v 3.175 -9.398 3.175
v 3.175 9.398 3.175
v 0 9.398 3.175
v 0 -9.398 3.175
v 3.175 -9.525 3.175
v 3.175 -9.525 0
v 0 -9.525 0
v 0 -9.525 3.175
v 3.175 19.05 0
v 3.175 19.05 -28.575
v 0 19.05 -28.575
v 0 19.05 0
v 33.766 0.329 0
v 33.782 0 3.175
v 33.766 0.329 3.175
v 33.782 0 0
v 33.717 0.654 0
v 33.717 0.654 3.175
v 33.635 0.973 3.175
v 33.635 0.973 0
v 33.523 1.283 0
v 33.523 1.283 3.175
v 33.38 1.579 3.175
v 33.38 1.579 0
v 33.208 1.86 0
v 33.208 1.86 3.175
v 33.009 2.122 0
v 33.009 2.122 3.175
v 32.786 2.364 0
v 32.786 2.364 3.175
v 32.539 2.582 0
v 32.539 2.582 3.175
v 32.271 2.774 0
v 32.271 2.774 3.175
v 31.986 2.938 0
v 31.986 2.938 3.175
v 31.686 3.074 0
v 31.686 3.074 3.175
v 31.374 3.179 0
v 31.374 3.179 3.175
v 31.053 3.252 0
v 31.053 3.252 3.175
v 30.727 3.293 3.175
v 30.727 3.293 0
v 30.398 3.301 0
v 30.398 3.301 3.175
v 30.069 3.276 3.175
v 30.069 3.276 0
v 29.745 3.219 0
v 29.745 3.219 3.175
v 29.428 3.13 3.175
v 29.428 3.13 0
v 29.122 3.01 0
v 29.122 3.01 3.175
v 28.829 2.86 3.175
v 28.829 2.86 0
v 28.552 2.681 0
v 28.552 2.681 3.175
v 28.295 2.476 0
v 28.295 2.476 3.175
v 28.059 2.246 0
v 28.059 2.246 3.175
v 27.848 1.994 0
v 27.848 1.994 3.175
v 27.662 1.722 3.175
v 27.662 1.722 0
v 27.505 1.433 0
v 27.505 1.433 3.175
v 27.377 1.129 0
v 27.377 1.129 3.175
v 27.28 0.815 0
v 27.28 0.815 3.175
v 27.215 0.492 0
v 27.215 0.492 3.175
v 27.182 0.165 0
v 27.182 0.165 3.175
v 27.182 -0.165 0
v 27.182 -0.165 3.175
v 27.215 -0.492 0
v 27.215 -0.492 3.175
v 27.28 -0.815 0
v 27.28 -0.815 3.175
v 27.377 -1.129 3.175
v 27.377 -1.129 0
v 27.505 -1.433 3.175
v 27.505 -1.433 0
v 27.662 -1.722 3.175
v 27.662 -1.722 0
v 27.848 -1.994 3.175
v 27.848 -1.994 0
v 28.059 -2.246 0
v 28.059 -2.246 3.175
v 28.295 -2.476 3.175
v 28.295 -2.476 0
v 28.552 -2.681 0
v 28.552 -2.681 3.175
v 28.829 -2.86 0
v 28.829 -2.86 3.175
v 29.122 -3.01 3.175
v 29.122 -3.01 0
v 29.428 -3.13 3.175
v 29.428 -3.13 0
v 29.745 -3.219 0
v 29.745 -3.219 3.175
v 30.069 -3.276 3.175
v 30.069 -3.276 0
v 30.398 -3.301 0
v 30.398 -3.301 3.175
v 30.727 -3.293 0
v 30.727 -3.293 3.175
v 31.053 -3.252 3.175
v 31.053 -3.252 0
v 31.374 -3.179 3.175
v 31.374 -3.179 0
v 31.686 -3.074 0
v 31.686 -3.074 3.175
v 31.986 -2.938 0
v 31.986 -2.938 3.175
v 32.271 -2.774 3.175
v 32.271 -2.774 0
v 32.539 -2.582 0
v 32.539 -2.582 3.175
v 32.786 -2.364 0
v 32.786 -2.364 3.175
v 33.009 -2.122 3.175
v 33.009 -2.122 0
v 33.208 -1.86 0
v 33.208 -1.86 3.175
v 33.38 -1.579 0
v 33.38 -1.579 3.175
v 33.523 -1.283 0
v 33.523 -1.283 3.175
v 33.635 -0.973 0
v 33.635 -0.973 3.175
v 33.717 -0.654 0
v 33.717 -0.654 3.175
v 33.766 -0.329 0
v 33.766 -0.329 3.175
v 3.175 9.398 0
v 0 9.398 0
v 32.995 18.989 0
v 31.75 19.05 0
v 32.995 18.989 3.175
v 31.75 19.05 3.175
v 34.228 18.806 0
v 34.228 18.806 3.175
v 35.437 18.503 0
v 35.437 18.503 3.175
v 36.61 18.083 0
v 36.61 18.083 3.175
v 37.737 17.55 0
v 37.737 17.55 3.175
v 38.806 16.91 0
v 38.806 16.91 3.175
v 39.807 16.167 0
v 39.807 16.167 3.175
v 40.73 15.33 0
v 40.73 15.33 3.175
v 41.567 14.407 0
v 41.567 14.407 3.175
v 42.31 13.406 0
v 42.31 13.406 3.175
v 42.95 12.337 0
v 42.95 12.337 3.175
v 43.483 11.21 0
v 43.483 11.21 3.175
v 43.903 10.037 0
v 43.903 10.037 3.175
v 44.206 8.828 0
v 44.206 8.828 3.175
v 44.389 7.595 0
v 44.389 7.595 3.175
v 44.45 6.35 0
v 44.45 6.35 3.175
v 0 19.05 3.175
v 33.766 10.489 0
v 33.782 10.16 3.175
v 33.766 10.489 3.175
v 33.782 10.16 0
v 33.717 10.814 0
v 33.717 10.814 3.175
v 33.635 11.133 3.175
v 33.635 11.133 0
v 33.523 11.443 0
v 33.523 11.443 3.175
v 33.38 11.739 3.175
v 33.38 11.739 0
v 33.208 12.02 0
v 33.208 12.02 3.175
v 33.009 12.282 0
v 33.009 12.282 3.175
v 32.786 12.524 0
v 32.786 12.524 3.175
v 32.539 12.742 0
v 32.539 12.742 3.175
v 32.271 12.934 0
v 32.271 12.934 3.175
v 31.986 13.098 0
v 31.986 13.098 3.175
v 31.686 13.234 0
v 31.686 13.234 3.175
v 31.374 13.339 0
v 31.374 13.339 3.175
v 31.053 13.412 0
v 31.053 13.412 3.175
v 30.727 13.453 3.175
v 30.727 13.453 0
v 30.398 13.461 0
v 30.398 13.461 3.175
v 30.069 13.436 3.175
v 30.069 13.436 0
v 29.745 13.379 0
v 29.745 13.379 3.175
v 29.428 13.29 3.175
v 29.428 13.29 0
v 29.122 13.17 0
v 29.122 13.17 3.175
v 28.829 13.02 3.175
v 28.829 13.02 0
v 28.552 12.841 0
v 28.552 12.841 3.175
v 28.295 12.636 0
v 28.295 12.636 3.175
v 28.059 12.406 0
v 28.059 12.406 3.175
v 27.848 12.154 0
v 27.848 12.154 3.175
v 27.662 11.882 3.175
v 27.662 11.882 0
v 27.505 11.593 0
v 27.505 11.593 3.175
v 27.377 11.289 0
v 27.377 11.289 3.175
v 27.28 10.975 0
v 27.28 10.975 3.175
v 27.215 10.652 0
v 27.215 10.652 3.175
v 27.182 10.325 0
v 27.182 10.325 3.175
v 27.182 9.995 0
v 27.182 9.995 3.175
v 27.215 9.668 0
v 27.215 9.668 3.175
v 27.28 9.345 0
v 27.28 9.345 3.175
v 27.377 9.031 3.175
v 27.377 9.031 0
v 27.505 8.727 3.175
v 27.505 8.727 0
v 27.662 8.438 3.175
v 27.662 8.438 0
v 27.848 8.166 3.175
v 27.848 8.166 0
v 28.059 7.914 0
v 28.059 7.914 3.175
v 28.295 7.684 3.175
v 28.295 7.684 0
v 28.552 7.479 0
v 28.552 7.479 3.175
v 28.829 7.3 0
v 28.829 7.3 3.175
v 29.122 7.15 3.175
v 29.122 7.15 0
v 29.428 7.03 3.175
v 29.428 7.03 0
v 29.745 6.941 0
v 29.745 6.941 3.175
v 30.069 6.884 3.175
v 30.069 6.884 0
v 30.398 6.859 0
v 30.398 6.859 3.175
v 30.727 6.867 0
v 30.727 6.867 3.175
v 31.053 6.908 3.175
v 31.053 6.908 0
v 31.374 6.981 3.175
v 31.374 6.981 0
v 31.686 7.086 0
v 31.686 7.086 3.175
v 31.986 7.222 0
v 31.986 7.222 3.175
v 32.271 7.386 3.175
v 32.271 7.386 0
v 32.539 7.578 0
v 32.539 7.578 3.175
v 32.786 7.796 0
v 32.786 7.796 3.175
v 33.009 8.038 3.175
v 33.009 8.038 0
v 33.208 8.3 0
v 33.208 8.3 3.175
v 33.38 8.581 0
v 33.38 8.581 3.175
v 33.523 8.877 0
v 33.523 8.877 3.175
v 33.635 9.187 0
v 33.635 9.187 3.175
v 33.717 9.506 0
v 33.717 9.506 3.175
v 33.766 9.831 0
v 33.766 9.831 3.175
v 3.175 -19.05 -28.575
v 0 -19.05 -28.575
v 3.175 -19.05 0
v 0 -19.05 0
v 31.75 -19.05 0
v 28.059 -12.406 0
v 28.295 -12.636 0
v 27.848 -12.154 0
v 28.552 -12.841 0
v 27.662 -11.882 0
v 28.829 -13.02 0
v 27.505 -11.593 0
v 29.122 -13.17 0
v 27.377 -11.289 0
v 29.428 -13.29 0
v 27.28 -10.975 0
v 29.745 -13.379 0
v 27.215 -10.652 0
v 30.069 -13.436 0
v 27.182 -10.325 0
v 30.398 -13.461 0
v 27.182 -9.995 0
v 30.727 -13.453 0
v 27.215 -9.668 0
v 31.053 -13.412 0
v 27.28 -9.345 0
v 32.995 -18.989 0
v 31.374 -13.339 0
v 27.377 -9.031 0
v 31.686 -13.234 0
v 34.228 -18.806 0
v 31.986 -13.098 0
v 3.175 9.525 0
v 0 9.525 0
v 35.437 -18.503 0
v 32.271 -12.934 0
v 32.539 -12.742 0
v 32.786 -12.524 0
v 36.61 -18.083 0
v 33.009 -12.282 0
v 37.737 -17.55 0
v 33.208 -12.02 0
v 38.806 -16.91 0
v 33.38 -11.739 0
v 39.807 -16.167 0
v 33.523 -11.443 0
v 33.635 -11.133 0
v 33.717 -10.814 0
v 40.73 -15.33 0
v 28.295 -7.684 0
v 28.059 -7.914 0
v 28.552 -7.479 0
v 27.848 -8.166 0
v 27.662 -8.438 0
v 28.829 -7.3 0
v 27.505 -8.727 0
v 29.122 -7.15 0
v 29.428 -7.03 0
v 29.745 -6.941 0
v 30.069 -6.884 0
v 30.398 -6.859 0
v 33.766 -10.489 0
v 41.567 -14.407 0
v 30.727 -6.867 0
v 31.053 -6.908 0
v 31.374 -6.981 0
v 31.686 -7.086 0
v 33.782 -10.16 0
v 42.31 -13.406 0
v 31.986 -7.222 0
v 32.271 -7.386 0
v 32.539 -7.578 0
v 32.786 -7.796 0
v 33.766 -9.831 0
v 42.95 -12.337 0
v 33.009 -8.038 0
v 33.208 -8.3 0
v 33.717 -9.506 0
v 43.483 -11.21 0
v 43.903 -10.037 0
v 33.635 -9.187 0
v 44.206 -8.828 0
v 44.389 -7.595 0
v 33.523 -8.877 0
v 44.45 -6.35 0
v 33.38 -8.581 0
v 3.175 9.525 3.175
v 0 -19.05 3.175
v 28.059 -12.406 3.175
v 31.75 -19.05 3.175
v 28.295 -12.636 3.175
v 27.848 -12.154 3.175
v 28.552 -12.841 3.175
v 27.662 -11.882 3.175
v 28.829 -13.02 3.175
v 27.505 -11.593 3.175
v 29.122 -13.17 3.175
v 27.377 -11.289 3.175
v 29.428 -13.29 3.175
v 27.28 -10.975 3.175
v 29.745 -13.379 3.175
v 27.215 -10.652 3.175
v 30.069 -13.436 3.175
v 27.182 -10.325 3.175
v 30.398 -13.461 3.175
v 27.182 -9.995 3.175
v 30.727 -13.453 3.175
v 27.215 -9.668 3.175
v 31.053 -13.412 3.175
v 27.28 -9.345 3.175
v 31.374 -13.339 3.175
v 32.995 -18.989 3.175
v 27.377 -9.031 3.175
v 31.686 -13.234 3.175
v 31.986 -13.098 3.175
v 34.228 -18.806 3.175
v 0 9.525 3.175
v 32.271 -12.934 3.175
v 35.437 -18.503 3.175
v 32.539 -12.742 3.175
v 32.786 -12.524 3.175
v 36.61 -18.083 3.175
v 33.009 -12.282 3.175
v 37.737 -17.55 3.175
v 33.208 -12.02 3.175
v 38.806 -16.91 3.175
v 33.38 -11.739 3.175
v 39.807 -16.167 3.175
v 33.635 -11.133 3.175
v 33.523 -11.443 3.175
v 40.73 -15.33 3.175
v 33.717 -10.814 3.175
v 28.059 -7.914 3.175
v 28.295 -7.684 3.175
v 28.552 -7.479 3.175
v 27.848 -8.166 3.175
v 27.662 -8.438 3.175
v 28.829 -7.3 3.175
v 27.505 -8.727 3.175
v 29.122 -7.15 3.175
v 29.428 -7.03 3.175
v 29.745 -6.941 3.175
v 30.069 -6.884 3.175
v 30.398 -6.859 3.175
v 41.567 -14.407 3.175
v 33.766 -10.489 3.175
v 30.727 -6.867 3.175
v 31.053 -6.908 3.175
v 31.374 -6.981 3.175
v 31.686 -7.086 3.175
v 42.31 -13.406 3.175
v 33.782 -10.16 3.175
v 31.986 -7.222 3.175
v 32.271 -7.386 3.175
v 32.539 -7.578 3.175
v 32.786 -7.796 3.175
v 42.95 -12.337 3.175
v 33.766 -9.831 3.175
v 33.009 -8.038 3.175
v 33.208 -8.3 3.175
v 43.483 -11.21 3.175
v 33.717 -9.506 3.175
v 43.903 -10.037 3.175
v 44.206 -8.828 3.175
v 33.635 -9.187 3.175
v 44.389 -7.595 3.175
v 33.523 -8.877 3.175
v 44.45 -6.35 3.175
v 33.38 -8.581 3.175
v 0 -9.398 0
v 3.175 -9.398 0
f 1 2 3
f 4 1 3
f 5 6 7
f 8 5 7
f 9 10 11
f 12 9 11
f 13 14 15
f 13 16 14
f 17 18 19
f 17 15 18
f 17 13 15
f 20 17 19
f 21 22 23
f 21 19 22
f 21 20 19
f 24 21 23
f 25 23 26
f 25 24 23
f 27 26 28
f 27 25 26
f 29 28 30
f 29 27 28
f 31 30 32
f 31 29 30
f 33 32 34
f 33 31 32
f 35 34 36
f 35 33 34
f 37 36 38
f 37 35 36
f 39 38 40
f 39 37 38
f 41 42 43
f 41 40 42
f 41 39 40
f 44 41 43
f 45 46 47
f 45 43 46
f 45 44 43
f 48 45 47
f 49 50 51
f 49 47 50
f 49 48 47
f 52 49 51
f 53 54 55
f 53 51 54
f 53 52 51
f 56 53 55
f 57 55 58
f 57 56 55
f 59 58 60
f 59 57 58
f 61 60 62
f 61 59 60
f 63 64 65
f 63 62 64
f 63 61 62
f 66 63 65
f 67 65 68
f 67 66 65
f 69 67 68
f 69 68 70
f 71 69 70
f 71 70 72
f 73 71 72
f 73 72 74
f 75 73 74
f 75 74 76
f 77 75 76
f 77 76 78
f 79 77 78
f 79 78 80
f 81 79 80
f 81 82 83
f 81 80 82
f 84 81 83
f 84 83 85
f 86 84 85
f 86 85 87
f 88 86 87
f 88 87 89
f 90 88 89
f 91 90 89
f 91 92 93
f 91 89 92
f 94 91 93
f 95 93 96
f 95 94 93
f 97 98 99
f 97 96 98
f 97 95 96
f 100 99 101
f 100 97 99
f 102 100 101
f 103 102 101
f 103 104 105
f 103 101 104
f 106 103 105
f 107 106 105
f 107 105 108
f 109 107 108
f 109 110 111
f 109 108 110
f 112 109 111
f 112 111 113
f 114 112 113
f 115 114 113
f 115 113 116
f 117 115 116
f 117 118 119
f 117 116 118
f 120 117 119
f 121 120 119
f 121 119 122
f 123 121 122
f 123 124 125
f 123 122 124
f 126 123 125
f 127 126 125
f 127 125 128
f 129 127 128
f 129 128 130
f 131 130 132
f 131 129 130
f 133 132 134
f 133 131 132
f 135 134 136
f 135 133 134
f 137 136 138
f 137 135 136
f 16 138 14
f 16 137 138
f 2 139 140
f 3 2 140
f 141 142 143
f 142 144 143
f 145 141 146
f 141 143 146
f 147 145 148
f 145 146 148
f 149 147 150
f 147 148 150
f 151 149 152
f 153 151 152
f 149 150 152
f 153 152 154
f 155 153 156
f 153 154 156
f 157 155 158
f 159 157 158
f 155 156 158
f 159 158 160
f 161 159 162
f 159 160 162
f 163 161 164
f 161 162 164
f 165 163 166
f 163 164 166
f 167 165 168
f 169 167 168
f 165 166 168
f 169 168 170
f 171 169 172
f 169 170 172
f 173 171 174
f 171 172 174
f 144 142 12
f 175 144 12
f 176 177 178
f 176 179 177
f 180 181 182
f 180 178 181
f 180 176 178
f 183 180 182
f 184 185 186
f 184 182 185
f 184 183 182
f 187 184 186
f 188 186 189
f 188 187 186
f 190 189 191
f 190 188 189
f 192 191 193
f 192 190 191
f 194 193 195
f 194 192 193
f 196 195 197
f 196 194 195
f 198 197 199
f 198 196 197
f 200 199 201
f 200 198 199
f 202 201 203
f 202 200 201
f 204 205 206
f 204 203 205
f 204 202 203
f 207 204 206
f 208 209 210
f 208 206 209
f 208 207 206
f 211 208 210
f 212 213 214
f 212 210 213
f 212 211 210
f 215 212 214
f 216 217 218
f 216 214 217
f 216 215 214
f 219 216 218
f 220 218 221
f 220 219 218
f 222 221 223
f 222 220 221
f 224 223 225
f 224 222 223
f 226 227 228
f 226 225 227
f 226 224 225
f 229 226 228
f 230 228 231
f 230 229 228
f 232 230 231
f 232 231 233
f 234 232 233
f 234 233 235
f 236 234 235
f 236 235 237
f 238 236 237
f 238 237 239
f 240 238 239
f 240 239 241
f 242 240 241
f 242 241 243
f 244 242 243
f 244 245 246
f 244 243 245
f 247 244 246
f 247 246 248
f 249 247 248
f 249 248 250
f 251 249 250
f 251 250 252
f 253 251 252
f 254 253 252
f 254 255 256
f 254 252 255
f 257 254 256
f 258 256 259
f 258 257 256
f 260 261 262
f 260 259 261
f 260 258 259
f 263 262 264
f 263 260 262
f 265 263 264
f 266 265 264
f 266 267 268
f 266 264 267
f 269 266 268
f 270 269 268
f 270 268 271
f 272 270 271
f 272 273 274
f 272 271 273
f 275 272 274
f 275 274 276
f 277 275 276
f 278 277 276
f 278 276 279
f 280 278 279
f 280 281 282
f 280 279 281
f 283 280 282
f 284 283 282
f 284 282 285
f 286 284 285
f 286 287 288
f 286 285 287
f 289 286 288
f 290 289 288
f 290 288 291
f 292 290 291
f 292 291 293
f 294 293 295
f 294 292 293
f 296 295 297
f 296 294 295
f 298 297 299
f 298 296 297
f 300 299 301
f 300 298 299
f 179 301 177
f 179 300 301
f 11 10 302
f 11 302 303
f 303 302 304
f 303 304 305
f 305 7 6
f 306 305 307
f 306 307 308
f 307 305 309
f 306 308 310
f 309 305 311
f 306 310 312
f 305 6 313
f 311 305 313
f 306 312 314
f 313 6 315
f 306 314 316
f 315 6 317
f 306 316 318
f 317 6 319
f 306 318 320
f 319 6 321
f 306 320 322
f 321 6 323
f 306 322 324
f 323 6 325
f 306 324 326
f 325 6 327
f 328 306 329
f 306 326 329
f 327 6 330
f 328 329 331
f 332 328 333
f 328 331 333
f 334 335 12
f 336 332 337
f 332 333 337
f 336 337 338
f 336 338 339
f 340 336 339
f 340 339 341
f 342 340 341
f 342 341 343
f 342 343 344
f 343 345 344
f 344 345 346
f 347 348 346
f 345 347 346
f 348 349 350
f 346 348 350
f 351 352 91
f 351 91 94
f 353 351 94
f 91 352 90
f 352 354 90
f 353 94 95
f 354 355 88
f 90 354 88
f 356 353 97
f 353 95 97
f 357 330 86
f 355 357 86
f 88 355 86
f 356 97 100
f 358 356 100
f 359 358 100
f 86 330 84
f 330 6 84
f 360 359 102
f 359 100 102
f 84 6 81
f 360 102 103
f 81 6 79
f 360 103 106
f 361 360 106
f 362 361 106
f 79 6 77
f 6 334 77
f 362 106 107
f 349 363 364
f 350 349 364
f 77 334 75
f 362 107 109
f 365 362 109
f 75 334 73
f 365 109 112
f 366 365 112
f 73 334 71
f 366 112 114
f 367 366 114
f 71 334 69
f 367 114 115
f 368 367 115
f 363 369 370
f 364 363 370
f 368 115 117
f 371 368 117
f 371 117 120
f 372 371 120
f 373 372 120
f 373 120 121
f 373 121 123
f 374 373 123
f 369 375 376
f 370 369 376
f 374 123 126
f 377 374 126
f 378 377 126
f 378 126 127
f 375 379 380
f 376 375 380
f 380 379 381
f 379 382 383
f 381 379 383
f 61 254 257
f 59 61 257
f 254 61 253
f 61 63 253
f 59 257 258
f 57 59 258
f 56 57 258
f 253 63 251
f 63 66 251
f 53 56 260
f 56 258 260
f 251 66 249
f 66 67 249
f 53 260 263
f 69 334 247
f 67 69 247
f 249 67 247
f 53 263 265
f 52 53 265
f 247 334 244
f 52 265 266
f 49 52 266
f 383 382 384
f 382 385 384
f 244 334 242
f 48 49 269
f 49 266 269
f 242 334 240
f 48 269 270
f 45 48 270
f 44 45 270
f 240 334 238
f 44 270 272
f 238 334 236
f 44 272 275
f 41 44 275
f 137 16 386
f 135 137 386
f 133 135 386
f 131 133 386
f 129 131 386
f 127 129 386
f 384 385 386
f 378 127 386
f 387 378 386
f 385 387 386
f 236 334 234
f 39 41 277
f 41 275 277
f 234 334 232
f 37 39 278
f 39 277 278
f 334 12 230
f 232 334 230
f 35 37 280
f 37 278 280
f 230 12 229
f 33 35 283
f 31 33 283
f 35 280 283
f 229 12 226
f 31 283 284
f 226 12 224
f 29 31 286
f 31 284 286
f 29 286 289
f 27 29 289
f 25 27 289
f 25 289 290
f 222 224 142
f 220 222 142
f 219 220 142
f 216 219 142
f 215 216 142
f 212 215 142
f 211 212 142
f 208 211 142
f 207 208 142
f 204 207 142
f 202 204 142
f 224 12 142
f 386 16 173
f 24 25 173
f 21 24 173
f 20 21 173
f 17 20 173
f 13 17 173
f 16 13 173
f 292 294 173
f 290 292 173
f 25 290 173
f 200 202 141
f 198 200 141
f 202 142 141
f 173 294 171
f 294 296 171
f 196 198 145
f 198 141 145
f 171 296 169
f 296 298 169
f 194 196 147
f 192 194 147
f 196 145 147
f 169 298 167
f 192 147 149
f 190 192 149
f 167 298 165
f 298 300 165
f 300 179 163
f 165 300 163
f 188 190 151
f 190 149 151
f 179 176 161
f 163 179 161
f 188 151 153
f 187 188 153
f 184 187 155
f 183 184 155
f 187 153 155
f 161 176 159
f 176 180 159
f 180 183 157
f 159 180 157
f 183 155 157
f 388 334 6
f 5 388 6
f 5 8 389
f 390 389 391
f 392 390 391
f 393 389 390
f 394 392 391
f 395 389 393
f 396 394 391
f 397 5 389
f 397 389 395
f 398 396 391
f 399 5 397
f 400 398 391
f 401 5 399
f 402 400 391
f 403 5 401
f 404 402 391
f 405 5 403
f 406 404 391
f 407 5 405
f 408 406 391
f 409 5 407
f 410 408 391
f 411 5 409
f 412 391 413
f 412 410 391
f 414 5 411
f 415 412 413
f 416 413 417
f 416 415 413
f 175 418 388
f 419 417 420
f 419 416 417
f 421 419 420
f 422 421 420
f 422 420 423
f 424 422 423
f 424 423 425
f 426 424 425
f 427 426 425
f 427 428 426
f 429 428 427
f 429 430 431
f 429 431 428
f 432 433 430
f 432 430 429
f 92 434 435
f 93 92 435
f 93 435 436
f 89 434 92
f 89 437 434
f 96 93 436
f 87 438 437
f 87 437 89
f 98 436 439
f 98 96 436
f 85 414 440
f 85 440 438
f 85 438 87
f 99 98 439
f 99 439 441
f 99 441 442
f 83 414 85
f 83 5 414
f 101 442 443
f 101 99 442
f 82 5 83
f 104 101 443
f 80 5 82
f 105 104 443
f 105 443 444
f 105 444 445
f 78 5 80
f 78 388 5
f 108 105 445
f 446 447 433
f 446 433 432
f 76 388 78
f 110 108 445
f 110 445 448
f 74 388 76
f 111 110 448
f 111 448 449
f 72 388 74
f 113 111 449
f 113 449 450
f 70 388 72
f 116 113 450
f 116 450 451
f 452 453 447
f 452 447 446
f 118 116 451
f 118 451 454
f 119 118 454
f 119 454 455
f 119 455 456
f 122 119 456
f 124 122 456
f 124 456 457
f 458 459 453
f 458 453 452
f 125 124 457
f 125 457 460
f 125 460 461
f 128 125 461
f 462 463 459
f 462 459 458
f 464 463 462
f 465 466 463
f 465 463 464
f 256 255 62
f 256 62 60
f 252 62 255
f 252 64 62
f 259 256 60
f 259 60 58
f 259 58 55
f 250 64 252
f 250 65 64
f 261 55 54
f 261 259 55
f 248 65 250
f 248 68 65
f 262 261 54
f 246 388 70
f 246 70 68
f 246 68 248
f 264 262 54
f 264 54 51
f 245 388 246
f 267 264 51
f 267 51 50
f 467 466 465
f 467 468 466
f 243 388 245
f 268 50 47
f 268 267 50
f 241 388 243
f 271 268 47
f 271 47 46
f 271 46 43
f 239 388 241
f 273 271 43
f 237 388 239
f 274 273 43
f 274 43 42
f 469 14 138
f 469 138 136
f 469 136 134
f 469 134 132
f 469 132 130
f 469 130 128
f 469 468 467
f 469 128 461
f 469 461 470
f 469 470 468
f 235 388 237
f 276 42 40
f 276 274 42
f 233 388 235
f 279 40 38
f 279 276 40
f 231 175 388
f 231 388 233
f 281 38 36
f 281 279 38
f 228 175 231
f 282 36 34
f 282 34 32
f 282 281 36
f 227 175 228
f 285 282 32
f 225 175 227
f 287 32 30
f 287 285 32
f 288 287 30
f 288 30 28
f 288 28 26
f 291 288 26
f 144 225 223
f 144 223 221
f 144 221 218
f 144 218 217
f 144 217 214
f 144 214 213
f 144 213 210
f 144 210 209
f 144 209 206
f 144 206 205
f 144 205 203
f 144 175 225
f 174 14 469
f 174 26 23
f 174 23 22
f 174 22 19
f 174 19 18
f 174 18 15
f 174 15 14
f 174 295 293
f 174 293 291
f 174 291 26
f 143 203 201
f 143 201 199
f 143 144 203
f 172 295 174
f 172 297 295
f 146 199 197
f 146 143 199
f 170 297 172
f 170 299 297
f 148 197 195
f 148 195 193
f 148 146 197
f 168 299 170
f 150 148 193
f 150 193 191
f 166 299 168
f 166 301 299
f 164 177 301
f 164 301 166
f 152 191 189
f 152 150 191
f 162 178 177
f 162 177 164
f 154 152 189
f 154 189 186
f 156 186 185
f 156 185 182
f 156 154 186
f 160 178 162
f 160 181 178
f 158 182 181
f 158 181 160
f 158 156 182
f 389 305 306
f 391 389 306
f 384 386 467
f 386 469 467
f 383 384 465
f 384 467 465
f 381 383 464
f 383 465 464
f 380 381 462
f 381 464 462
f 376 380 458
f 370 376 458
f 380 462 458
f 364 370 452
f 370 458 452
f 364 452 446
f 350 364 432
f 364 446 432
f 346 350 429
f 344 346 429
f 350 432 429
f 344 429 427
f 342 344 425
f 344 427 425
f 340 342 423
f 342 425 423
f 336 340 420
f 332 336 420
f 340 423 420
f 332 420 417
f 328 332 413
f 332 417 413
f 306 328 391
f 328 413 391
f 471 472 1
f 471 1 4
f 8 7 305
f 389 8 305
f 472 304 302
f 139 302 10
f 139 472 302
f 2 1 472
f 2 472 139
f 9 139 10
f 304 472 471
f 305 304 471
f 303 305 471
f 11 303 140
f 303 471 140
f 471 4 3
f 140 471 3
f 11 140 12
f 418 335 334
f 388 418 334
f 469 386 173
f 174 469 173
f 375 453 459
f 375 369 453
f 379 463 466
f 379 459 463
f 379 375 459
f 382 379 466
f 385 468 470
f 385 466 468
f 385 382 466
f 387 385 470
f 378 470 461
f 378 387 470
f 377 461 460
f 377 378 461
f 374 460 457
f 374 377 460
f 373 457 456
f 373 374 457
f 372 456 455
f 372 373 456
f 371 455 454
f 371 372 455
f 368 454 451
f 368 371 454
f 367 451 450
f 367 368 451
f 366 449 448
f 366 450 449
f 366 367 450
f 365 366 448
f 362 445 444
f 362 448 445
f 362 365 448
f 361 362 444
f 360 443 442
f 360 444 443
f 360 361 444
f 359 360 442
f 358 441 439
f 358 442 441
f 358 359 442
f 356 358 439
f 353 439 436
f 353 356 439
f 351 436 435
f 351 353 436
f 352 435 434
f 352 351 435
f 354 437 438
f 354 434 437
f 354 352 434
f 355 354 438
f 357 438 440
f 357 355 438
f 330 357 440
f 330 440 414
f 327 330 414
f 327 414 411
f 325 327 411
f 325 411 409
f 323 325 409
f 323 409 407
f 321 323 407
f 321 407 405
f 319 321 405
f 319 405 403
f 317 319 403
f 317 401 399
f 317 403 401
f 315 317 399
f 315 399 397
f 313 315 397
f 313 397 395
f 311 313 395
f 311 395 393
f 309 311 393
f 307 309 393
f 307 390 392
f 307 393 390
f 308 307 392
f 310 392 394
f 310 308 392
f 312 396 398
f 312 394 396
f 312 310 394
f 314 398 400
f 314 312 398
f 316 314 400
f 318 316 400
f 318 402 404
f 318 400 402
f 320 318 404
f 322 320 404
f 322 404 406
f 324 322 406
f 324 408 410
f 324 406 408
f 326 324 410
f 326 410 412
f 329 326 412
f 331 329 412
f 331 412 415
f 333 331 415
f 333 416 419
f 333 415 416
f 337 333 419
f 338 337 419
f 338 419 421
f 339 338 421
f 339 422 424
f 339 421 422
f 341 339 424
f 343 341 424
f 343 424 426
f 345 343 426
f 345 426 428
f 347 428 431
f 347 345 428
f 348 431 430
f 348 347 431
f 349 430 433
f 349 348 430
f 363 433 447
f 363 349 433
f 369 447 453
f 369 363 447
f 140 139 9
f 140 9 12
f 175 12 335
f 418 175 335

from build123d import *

# Parameters (mm, degrees)
BOSS_EXTRUDE1_DEPTH     = 3.175
CUT_EXTRUDE1_DEPTH      = 49.464271634
CUT_EXTRUDE1_DEPTH_BACK = 49.464271634
SKETCH2_R               = 3.302
SKETCH3_W               = 3.175
SKETCH3_H               = 38.1
BOSS_EXTRUDE2_DEPTH     = 28.575
SKETCH3_4_W             = 3.175
SKETCH3_4_H             = 18.796
BOSS_EXTRUDE5_DEPTH     = 3.175
FILLET1_R               = 12.7


with BuildPart() as part:
    # Sketch1 → Boss-Extrude1 (new body)
    with BuildSketch(Plane.XY):
        Polygon((0, 19.05), (0, 9.525), (3.175, 9.525), (3.175, -9.525), (0, -9.525), (0, -19.05), (44.45, -19.05), (44.45, 19.05), align=None)
    extrude(amount=BOSS_EXTRUDE1_DEPTH)

    # Sketch2 → Cut-Extrude1 (cut, two sides: drawn at the far end of the back side and taken through both)
    with BuildSketch(Plane.XY.offset(3.175).offset(-CUT_EXTRUDE1_DEPTH_BACK)):
        with Locations((30.48, 10.16)):
            Circle(SKETCH2_R)
        with Locations((30.48, -10.16)):
            Circle(SKETCH2_R)
        with Locations((30.48, 0)):
            Circle(SKETCH2_R)
    extrude(amount=CUT_EXTRUDE1_DEPTH + CUT_EXTRUDE1_DEPTH_BACK, mode=Mode.SUBTRACT)

    # Fillet1
    fillet1_edges = [part.edges().sort_by_distance(p)[0] for p in [
        (44.45, 19.05, 1.5875),
        (44.45, -19.05, 1.5875),
    ]]
    fillet(fillet1_edges, radius=FILLET1_R)


with BuildPart() as body_2:
    # Sketch3 → Boss-Extrude2 (new body)
    with BuildSketch(Plane(origin=(0, 0, 0), x_dir=(-1, 0, 0), z_dir=(0, 0, -1))):
        with Locations((-1.5875, 0)):
            Rectangle(SKETCH3_W, SKETCH3_H)
    extrude(amount=BOSS_EXTRUDE2_DEPTH)

    # Sketch3<4> → Boss-Extrude5 (add)
    with BuildSketch(Plane(origin=(0, 0, 0), x_dir=(-1, 0, 0), z_dir=(0, 0, -1))):
        with Locations((-1.5875, 0)):
            Rectangle(SKETCH3_4_W, SKETCH3_4_H)
    extrude(amount=-BOSS_EXTRUDE5_DEPTH)


solid = Compound([part.part, body_2.part])
